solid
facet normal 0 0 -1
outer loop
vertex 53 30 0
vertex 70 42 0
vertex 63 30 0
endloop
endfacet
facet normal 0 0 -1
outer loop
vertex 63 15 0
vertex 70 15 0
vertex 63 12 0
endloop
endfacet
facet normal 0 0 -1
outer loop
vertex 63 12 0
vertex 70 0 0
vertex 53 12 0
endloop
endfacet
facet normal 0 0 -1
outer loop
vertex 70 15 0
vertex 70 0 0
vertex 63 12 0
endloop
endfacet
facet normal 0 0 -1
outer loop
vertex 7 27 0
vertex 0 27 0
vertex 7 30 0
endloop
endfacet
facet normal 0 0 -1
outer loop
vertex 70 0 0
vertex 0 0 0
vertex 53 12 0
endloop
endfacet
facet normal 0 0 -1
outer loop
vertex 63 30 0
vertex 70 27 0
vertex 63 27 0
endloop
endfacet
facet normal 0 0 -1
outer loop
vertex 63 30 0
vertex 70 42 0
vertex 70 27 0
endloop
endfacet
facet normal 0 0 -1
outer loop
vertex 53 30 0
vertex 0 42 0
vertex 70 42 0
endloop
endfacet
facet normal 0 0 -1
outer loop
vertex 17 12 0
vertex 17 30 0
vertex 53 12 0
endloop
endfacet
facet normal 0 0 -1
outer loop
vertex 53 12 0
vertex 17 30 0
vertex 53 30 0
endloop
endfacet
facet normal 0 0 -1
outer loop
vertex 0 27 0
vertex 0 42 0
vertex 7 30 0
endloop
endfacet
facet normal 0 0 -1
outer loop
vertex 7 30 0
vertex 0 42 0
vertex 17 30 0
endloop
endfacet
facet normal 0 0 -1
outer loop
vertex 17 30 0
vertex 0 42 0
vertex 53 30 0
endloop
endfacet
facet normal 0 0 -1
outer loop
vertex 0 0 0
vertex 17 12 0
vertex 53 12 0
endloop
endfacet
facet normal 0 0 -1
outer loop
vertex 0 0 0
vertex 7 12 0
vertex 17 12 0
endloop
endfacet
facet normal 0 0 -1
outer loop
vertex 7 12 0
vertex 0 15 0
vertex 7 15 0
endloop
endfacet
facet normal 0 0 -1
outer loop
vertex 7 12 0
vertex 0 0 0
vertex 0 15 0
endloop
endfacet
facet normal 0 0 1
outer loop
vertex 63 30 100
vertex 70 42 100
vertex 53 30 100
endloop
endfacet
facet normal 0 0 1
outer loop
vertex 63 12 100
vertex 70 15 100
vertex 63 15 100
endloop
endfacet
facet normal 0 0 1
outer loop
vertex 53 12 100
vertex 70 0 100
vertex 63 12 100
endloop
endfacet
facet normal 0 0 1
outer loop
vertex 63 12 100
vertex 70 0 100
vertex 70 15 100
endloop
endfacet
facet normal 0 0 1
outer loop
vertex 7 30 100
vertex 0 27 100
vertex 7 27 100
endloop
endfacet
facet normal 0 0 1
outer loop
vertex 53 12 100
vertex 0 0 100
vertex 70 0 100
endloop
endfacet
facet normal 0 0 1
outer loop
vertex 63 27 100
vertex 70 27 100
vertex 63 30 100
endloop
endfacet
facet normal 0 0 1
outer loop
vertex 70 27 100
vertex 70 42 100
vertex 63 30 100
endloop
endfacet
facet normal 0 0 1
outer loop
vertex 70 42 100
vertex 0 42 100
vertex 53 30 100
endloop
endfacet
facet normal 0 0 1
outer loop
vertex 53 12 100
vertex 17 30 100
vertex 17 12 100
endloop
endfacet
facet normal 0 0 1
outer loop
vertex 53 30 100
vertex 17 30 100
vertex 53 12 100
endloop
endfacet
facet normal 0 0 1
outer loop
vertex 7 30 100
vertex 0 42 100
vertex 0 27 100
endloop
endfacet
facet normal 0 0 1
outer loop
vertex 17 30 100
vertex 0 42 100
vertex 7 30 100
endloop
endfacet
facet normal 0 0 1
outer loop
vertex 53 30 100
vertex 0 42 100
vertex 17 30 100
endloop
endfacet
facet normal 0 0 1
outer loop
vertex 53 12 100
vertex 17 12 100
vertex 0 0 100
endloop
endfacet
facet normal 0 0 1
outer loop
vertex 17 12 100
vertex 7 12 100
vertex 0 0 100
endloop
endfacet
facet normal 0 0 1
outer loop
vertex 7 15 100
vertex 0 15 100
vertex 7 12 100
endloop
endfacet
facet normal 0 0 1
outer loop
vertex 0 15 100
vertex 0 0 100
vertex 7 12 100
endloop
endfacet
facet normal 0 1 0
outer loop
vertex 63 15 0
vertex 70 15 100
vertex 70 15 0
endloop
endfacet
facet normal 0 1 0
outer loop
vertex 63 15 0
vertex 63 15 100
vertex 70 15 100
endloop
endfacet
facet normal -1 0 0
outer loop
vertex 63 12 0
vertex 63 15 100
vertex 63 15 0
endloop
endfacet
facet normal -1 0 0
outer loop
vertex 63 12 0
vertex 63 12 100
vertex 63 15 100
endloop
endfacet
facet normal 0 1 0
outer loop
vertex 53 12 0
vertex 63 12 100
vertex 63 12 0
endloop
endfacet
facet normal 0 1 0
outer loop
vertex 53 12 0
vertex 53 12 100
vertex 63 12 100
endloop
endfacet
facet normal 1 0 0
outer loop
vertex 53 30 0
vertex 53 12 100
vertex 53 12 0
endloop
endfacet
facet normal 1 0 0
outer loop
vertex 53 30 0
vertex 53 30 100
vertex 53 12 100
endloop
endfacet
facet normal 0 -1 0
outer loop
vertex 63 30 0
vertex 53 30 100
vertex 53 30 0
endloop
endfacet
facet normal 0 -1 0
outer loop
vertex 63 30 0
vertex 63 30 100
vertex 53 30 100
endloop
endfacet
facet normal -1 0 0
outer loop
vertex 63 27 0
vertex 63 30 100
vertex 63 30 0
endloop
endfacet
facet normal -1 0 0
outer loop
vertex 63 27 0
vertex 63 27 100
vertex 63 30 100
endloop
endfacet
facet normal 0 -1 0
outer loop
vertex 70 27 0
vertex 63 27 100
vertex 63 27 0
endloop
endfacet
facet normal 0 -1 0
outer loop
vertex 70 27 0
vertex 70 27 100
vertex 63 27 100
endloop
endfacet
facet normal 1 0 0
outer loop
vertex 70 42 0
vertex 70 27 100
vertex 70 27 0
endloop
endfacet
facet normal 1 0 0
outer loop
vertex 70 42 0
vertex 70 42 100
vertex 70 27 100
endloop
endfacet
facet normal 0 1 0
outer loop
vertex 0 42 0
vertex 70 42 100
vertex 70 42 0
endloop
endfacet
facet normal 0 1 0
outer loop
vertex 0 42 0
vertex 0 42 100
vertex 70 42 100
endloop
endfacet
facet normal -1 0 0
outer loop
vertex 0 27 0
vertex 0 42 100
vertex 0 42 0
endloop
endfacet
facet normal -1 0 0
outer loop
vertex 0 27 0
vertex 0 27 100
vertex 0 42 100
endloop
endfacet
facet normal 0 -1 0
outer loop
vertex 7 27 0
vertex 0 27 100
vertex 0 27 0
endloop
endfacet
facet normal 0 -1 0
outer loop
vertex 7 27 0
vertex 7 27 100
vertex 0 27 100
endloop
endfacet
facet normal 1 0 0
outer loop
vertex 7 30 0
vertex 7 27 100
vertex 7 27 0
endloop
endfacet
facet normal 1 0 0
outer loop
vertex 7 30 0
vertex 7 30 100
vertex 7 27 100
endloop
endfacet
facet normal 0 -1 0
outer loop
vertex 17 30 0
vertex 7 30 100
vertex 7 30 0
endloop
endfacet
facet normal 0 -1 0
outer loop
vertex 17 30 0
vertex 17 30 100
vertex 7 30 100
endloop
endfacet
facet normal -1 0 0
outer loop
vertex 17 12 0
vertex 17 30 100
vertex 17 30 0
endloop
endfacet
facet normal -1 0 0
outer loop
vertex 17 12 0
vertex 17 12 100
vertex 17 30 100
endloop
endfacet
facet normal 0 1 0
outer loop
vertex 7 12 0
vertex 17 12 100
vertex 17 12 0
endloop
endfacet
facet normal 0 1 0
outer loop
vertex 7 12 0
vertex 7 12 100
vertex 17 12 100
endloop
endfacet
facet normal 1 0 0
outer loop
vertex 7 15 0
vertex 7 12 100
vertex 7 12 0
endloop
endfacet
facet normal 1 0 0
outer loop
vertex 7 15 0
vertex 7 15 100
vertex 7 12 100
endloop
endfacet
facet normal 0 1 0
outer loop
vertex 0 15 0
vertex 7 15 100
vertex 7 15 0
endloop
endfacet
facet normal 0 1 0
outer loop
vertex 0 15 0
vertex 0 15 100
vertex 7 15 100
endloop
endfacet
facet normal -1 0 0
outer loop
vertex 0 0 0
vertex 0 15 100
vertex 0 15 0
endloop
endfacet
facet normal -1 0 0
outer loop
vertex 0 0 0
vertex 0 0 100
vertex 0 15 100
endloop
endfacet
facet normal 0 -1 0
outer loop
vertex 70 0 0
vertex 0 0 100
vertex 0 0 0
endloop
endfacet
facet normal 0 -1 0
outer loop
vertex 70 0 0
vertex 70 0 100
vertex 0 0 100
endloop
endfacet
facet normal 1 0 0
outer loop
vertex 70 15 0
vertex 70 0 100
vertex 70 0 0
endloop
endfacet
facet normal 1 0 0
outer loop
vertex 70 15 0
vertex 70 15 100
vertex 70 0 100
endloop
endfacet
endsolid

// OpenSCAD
$fn = 32;

// ----------------------------------------------------------------------
// T-slot rail: 70 x 42 mm section, 100 mm long
// ----------------------------------------------------------------------

// --- parameters (mm) ---
profile_height = 100;     // extrusion height
profile_points = 20;      // points of the closed outline

profile = [[0, 0], [70, 0], [70, 15], [63, 15], [63, 12], [53, 12], [53, 30], [63, 30], [63, 27], [70, 27], [70, 42], [0, 42], [0, 27], [7, 27], [7, 30], [17, 30], [17, 12], [7, 12], [7, 15], [0, 15]];  // single closed polygon, 20 points, counter clockwise

// --- the one profile operation ---
linear_extrude(height = profile_height) polygon(points = profile);
